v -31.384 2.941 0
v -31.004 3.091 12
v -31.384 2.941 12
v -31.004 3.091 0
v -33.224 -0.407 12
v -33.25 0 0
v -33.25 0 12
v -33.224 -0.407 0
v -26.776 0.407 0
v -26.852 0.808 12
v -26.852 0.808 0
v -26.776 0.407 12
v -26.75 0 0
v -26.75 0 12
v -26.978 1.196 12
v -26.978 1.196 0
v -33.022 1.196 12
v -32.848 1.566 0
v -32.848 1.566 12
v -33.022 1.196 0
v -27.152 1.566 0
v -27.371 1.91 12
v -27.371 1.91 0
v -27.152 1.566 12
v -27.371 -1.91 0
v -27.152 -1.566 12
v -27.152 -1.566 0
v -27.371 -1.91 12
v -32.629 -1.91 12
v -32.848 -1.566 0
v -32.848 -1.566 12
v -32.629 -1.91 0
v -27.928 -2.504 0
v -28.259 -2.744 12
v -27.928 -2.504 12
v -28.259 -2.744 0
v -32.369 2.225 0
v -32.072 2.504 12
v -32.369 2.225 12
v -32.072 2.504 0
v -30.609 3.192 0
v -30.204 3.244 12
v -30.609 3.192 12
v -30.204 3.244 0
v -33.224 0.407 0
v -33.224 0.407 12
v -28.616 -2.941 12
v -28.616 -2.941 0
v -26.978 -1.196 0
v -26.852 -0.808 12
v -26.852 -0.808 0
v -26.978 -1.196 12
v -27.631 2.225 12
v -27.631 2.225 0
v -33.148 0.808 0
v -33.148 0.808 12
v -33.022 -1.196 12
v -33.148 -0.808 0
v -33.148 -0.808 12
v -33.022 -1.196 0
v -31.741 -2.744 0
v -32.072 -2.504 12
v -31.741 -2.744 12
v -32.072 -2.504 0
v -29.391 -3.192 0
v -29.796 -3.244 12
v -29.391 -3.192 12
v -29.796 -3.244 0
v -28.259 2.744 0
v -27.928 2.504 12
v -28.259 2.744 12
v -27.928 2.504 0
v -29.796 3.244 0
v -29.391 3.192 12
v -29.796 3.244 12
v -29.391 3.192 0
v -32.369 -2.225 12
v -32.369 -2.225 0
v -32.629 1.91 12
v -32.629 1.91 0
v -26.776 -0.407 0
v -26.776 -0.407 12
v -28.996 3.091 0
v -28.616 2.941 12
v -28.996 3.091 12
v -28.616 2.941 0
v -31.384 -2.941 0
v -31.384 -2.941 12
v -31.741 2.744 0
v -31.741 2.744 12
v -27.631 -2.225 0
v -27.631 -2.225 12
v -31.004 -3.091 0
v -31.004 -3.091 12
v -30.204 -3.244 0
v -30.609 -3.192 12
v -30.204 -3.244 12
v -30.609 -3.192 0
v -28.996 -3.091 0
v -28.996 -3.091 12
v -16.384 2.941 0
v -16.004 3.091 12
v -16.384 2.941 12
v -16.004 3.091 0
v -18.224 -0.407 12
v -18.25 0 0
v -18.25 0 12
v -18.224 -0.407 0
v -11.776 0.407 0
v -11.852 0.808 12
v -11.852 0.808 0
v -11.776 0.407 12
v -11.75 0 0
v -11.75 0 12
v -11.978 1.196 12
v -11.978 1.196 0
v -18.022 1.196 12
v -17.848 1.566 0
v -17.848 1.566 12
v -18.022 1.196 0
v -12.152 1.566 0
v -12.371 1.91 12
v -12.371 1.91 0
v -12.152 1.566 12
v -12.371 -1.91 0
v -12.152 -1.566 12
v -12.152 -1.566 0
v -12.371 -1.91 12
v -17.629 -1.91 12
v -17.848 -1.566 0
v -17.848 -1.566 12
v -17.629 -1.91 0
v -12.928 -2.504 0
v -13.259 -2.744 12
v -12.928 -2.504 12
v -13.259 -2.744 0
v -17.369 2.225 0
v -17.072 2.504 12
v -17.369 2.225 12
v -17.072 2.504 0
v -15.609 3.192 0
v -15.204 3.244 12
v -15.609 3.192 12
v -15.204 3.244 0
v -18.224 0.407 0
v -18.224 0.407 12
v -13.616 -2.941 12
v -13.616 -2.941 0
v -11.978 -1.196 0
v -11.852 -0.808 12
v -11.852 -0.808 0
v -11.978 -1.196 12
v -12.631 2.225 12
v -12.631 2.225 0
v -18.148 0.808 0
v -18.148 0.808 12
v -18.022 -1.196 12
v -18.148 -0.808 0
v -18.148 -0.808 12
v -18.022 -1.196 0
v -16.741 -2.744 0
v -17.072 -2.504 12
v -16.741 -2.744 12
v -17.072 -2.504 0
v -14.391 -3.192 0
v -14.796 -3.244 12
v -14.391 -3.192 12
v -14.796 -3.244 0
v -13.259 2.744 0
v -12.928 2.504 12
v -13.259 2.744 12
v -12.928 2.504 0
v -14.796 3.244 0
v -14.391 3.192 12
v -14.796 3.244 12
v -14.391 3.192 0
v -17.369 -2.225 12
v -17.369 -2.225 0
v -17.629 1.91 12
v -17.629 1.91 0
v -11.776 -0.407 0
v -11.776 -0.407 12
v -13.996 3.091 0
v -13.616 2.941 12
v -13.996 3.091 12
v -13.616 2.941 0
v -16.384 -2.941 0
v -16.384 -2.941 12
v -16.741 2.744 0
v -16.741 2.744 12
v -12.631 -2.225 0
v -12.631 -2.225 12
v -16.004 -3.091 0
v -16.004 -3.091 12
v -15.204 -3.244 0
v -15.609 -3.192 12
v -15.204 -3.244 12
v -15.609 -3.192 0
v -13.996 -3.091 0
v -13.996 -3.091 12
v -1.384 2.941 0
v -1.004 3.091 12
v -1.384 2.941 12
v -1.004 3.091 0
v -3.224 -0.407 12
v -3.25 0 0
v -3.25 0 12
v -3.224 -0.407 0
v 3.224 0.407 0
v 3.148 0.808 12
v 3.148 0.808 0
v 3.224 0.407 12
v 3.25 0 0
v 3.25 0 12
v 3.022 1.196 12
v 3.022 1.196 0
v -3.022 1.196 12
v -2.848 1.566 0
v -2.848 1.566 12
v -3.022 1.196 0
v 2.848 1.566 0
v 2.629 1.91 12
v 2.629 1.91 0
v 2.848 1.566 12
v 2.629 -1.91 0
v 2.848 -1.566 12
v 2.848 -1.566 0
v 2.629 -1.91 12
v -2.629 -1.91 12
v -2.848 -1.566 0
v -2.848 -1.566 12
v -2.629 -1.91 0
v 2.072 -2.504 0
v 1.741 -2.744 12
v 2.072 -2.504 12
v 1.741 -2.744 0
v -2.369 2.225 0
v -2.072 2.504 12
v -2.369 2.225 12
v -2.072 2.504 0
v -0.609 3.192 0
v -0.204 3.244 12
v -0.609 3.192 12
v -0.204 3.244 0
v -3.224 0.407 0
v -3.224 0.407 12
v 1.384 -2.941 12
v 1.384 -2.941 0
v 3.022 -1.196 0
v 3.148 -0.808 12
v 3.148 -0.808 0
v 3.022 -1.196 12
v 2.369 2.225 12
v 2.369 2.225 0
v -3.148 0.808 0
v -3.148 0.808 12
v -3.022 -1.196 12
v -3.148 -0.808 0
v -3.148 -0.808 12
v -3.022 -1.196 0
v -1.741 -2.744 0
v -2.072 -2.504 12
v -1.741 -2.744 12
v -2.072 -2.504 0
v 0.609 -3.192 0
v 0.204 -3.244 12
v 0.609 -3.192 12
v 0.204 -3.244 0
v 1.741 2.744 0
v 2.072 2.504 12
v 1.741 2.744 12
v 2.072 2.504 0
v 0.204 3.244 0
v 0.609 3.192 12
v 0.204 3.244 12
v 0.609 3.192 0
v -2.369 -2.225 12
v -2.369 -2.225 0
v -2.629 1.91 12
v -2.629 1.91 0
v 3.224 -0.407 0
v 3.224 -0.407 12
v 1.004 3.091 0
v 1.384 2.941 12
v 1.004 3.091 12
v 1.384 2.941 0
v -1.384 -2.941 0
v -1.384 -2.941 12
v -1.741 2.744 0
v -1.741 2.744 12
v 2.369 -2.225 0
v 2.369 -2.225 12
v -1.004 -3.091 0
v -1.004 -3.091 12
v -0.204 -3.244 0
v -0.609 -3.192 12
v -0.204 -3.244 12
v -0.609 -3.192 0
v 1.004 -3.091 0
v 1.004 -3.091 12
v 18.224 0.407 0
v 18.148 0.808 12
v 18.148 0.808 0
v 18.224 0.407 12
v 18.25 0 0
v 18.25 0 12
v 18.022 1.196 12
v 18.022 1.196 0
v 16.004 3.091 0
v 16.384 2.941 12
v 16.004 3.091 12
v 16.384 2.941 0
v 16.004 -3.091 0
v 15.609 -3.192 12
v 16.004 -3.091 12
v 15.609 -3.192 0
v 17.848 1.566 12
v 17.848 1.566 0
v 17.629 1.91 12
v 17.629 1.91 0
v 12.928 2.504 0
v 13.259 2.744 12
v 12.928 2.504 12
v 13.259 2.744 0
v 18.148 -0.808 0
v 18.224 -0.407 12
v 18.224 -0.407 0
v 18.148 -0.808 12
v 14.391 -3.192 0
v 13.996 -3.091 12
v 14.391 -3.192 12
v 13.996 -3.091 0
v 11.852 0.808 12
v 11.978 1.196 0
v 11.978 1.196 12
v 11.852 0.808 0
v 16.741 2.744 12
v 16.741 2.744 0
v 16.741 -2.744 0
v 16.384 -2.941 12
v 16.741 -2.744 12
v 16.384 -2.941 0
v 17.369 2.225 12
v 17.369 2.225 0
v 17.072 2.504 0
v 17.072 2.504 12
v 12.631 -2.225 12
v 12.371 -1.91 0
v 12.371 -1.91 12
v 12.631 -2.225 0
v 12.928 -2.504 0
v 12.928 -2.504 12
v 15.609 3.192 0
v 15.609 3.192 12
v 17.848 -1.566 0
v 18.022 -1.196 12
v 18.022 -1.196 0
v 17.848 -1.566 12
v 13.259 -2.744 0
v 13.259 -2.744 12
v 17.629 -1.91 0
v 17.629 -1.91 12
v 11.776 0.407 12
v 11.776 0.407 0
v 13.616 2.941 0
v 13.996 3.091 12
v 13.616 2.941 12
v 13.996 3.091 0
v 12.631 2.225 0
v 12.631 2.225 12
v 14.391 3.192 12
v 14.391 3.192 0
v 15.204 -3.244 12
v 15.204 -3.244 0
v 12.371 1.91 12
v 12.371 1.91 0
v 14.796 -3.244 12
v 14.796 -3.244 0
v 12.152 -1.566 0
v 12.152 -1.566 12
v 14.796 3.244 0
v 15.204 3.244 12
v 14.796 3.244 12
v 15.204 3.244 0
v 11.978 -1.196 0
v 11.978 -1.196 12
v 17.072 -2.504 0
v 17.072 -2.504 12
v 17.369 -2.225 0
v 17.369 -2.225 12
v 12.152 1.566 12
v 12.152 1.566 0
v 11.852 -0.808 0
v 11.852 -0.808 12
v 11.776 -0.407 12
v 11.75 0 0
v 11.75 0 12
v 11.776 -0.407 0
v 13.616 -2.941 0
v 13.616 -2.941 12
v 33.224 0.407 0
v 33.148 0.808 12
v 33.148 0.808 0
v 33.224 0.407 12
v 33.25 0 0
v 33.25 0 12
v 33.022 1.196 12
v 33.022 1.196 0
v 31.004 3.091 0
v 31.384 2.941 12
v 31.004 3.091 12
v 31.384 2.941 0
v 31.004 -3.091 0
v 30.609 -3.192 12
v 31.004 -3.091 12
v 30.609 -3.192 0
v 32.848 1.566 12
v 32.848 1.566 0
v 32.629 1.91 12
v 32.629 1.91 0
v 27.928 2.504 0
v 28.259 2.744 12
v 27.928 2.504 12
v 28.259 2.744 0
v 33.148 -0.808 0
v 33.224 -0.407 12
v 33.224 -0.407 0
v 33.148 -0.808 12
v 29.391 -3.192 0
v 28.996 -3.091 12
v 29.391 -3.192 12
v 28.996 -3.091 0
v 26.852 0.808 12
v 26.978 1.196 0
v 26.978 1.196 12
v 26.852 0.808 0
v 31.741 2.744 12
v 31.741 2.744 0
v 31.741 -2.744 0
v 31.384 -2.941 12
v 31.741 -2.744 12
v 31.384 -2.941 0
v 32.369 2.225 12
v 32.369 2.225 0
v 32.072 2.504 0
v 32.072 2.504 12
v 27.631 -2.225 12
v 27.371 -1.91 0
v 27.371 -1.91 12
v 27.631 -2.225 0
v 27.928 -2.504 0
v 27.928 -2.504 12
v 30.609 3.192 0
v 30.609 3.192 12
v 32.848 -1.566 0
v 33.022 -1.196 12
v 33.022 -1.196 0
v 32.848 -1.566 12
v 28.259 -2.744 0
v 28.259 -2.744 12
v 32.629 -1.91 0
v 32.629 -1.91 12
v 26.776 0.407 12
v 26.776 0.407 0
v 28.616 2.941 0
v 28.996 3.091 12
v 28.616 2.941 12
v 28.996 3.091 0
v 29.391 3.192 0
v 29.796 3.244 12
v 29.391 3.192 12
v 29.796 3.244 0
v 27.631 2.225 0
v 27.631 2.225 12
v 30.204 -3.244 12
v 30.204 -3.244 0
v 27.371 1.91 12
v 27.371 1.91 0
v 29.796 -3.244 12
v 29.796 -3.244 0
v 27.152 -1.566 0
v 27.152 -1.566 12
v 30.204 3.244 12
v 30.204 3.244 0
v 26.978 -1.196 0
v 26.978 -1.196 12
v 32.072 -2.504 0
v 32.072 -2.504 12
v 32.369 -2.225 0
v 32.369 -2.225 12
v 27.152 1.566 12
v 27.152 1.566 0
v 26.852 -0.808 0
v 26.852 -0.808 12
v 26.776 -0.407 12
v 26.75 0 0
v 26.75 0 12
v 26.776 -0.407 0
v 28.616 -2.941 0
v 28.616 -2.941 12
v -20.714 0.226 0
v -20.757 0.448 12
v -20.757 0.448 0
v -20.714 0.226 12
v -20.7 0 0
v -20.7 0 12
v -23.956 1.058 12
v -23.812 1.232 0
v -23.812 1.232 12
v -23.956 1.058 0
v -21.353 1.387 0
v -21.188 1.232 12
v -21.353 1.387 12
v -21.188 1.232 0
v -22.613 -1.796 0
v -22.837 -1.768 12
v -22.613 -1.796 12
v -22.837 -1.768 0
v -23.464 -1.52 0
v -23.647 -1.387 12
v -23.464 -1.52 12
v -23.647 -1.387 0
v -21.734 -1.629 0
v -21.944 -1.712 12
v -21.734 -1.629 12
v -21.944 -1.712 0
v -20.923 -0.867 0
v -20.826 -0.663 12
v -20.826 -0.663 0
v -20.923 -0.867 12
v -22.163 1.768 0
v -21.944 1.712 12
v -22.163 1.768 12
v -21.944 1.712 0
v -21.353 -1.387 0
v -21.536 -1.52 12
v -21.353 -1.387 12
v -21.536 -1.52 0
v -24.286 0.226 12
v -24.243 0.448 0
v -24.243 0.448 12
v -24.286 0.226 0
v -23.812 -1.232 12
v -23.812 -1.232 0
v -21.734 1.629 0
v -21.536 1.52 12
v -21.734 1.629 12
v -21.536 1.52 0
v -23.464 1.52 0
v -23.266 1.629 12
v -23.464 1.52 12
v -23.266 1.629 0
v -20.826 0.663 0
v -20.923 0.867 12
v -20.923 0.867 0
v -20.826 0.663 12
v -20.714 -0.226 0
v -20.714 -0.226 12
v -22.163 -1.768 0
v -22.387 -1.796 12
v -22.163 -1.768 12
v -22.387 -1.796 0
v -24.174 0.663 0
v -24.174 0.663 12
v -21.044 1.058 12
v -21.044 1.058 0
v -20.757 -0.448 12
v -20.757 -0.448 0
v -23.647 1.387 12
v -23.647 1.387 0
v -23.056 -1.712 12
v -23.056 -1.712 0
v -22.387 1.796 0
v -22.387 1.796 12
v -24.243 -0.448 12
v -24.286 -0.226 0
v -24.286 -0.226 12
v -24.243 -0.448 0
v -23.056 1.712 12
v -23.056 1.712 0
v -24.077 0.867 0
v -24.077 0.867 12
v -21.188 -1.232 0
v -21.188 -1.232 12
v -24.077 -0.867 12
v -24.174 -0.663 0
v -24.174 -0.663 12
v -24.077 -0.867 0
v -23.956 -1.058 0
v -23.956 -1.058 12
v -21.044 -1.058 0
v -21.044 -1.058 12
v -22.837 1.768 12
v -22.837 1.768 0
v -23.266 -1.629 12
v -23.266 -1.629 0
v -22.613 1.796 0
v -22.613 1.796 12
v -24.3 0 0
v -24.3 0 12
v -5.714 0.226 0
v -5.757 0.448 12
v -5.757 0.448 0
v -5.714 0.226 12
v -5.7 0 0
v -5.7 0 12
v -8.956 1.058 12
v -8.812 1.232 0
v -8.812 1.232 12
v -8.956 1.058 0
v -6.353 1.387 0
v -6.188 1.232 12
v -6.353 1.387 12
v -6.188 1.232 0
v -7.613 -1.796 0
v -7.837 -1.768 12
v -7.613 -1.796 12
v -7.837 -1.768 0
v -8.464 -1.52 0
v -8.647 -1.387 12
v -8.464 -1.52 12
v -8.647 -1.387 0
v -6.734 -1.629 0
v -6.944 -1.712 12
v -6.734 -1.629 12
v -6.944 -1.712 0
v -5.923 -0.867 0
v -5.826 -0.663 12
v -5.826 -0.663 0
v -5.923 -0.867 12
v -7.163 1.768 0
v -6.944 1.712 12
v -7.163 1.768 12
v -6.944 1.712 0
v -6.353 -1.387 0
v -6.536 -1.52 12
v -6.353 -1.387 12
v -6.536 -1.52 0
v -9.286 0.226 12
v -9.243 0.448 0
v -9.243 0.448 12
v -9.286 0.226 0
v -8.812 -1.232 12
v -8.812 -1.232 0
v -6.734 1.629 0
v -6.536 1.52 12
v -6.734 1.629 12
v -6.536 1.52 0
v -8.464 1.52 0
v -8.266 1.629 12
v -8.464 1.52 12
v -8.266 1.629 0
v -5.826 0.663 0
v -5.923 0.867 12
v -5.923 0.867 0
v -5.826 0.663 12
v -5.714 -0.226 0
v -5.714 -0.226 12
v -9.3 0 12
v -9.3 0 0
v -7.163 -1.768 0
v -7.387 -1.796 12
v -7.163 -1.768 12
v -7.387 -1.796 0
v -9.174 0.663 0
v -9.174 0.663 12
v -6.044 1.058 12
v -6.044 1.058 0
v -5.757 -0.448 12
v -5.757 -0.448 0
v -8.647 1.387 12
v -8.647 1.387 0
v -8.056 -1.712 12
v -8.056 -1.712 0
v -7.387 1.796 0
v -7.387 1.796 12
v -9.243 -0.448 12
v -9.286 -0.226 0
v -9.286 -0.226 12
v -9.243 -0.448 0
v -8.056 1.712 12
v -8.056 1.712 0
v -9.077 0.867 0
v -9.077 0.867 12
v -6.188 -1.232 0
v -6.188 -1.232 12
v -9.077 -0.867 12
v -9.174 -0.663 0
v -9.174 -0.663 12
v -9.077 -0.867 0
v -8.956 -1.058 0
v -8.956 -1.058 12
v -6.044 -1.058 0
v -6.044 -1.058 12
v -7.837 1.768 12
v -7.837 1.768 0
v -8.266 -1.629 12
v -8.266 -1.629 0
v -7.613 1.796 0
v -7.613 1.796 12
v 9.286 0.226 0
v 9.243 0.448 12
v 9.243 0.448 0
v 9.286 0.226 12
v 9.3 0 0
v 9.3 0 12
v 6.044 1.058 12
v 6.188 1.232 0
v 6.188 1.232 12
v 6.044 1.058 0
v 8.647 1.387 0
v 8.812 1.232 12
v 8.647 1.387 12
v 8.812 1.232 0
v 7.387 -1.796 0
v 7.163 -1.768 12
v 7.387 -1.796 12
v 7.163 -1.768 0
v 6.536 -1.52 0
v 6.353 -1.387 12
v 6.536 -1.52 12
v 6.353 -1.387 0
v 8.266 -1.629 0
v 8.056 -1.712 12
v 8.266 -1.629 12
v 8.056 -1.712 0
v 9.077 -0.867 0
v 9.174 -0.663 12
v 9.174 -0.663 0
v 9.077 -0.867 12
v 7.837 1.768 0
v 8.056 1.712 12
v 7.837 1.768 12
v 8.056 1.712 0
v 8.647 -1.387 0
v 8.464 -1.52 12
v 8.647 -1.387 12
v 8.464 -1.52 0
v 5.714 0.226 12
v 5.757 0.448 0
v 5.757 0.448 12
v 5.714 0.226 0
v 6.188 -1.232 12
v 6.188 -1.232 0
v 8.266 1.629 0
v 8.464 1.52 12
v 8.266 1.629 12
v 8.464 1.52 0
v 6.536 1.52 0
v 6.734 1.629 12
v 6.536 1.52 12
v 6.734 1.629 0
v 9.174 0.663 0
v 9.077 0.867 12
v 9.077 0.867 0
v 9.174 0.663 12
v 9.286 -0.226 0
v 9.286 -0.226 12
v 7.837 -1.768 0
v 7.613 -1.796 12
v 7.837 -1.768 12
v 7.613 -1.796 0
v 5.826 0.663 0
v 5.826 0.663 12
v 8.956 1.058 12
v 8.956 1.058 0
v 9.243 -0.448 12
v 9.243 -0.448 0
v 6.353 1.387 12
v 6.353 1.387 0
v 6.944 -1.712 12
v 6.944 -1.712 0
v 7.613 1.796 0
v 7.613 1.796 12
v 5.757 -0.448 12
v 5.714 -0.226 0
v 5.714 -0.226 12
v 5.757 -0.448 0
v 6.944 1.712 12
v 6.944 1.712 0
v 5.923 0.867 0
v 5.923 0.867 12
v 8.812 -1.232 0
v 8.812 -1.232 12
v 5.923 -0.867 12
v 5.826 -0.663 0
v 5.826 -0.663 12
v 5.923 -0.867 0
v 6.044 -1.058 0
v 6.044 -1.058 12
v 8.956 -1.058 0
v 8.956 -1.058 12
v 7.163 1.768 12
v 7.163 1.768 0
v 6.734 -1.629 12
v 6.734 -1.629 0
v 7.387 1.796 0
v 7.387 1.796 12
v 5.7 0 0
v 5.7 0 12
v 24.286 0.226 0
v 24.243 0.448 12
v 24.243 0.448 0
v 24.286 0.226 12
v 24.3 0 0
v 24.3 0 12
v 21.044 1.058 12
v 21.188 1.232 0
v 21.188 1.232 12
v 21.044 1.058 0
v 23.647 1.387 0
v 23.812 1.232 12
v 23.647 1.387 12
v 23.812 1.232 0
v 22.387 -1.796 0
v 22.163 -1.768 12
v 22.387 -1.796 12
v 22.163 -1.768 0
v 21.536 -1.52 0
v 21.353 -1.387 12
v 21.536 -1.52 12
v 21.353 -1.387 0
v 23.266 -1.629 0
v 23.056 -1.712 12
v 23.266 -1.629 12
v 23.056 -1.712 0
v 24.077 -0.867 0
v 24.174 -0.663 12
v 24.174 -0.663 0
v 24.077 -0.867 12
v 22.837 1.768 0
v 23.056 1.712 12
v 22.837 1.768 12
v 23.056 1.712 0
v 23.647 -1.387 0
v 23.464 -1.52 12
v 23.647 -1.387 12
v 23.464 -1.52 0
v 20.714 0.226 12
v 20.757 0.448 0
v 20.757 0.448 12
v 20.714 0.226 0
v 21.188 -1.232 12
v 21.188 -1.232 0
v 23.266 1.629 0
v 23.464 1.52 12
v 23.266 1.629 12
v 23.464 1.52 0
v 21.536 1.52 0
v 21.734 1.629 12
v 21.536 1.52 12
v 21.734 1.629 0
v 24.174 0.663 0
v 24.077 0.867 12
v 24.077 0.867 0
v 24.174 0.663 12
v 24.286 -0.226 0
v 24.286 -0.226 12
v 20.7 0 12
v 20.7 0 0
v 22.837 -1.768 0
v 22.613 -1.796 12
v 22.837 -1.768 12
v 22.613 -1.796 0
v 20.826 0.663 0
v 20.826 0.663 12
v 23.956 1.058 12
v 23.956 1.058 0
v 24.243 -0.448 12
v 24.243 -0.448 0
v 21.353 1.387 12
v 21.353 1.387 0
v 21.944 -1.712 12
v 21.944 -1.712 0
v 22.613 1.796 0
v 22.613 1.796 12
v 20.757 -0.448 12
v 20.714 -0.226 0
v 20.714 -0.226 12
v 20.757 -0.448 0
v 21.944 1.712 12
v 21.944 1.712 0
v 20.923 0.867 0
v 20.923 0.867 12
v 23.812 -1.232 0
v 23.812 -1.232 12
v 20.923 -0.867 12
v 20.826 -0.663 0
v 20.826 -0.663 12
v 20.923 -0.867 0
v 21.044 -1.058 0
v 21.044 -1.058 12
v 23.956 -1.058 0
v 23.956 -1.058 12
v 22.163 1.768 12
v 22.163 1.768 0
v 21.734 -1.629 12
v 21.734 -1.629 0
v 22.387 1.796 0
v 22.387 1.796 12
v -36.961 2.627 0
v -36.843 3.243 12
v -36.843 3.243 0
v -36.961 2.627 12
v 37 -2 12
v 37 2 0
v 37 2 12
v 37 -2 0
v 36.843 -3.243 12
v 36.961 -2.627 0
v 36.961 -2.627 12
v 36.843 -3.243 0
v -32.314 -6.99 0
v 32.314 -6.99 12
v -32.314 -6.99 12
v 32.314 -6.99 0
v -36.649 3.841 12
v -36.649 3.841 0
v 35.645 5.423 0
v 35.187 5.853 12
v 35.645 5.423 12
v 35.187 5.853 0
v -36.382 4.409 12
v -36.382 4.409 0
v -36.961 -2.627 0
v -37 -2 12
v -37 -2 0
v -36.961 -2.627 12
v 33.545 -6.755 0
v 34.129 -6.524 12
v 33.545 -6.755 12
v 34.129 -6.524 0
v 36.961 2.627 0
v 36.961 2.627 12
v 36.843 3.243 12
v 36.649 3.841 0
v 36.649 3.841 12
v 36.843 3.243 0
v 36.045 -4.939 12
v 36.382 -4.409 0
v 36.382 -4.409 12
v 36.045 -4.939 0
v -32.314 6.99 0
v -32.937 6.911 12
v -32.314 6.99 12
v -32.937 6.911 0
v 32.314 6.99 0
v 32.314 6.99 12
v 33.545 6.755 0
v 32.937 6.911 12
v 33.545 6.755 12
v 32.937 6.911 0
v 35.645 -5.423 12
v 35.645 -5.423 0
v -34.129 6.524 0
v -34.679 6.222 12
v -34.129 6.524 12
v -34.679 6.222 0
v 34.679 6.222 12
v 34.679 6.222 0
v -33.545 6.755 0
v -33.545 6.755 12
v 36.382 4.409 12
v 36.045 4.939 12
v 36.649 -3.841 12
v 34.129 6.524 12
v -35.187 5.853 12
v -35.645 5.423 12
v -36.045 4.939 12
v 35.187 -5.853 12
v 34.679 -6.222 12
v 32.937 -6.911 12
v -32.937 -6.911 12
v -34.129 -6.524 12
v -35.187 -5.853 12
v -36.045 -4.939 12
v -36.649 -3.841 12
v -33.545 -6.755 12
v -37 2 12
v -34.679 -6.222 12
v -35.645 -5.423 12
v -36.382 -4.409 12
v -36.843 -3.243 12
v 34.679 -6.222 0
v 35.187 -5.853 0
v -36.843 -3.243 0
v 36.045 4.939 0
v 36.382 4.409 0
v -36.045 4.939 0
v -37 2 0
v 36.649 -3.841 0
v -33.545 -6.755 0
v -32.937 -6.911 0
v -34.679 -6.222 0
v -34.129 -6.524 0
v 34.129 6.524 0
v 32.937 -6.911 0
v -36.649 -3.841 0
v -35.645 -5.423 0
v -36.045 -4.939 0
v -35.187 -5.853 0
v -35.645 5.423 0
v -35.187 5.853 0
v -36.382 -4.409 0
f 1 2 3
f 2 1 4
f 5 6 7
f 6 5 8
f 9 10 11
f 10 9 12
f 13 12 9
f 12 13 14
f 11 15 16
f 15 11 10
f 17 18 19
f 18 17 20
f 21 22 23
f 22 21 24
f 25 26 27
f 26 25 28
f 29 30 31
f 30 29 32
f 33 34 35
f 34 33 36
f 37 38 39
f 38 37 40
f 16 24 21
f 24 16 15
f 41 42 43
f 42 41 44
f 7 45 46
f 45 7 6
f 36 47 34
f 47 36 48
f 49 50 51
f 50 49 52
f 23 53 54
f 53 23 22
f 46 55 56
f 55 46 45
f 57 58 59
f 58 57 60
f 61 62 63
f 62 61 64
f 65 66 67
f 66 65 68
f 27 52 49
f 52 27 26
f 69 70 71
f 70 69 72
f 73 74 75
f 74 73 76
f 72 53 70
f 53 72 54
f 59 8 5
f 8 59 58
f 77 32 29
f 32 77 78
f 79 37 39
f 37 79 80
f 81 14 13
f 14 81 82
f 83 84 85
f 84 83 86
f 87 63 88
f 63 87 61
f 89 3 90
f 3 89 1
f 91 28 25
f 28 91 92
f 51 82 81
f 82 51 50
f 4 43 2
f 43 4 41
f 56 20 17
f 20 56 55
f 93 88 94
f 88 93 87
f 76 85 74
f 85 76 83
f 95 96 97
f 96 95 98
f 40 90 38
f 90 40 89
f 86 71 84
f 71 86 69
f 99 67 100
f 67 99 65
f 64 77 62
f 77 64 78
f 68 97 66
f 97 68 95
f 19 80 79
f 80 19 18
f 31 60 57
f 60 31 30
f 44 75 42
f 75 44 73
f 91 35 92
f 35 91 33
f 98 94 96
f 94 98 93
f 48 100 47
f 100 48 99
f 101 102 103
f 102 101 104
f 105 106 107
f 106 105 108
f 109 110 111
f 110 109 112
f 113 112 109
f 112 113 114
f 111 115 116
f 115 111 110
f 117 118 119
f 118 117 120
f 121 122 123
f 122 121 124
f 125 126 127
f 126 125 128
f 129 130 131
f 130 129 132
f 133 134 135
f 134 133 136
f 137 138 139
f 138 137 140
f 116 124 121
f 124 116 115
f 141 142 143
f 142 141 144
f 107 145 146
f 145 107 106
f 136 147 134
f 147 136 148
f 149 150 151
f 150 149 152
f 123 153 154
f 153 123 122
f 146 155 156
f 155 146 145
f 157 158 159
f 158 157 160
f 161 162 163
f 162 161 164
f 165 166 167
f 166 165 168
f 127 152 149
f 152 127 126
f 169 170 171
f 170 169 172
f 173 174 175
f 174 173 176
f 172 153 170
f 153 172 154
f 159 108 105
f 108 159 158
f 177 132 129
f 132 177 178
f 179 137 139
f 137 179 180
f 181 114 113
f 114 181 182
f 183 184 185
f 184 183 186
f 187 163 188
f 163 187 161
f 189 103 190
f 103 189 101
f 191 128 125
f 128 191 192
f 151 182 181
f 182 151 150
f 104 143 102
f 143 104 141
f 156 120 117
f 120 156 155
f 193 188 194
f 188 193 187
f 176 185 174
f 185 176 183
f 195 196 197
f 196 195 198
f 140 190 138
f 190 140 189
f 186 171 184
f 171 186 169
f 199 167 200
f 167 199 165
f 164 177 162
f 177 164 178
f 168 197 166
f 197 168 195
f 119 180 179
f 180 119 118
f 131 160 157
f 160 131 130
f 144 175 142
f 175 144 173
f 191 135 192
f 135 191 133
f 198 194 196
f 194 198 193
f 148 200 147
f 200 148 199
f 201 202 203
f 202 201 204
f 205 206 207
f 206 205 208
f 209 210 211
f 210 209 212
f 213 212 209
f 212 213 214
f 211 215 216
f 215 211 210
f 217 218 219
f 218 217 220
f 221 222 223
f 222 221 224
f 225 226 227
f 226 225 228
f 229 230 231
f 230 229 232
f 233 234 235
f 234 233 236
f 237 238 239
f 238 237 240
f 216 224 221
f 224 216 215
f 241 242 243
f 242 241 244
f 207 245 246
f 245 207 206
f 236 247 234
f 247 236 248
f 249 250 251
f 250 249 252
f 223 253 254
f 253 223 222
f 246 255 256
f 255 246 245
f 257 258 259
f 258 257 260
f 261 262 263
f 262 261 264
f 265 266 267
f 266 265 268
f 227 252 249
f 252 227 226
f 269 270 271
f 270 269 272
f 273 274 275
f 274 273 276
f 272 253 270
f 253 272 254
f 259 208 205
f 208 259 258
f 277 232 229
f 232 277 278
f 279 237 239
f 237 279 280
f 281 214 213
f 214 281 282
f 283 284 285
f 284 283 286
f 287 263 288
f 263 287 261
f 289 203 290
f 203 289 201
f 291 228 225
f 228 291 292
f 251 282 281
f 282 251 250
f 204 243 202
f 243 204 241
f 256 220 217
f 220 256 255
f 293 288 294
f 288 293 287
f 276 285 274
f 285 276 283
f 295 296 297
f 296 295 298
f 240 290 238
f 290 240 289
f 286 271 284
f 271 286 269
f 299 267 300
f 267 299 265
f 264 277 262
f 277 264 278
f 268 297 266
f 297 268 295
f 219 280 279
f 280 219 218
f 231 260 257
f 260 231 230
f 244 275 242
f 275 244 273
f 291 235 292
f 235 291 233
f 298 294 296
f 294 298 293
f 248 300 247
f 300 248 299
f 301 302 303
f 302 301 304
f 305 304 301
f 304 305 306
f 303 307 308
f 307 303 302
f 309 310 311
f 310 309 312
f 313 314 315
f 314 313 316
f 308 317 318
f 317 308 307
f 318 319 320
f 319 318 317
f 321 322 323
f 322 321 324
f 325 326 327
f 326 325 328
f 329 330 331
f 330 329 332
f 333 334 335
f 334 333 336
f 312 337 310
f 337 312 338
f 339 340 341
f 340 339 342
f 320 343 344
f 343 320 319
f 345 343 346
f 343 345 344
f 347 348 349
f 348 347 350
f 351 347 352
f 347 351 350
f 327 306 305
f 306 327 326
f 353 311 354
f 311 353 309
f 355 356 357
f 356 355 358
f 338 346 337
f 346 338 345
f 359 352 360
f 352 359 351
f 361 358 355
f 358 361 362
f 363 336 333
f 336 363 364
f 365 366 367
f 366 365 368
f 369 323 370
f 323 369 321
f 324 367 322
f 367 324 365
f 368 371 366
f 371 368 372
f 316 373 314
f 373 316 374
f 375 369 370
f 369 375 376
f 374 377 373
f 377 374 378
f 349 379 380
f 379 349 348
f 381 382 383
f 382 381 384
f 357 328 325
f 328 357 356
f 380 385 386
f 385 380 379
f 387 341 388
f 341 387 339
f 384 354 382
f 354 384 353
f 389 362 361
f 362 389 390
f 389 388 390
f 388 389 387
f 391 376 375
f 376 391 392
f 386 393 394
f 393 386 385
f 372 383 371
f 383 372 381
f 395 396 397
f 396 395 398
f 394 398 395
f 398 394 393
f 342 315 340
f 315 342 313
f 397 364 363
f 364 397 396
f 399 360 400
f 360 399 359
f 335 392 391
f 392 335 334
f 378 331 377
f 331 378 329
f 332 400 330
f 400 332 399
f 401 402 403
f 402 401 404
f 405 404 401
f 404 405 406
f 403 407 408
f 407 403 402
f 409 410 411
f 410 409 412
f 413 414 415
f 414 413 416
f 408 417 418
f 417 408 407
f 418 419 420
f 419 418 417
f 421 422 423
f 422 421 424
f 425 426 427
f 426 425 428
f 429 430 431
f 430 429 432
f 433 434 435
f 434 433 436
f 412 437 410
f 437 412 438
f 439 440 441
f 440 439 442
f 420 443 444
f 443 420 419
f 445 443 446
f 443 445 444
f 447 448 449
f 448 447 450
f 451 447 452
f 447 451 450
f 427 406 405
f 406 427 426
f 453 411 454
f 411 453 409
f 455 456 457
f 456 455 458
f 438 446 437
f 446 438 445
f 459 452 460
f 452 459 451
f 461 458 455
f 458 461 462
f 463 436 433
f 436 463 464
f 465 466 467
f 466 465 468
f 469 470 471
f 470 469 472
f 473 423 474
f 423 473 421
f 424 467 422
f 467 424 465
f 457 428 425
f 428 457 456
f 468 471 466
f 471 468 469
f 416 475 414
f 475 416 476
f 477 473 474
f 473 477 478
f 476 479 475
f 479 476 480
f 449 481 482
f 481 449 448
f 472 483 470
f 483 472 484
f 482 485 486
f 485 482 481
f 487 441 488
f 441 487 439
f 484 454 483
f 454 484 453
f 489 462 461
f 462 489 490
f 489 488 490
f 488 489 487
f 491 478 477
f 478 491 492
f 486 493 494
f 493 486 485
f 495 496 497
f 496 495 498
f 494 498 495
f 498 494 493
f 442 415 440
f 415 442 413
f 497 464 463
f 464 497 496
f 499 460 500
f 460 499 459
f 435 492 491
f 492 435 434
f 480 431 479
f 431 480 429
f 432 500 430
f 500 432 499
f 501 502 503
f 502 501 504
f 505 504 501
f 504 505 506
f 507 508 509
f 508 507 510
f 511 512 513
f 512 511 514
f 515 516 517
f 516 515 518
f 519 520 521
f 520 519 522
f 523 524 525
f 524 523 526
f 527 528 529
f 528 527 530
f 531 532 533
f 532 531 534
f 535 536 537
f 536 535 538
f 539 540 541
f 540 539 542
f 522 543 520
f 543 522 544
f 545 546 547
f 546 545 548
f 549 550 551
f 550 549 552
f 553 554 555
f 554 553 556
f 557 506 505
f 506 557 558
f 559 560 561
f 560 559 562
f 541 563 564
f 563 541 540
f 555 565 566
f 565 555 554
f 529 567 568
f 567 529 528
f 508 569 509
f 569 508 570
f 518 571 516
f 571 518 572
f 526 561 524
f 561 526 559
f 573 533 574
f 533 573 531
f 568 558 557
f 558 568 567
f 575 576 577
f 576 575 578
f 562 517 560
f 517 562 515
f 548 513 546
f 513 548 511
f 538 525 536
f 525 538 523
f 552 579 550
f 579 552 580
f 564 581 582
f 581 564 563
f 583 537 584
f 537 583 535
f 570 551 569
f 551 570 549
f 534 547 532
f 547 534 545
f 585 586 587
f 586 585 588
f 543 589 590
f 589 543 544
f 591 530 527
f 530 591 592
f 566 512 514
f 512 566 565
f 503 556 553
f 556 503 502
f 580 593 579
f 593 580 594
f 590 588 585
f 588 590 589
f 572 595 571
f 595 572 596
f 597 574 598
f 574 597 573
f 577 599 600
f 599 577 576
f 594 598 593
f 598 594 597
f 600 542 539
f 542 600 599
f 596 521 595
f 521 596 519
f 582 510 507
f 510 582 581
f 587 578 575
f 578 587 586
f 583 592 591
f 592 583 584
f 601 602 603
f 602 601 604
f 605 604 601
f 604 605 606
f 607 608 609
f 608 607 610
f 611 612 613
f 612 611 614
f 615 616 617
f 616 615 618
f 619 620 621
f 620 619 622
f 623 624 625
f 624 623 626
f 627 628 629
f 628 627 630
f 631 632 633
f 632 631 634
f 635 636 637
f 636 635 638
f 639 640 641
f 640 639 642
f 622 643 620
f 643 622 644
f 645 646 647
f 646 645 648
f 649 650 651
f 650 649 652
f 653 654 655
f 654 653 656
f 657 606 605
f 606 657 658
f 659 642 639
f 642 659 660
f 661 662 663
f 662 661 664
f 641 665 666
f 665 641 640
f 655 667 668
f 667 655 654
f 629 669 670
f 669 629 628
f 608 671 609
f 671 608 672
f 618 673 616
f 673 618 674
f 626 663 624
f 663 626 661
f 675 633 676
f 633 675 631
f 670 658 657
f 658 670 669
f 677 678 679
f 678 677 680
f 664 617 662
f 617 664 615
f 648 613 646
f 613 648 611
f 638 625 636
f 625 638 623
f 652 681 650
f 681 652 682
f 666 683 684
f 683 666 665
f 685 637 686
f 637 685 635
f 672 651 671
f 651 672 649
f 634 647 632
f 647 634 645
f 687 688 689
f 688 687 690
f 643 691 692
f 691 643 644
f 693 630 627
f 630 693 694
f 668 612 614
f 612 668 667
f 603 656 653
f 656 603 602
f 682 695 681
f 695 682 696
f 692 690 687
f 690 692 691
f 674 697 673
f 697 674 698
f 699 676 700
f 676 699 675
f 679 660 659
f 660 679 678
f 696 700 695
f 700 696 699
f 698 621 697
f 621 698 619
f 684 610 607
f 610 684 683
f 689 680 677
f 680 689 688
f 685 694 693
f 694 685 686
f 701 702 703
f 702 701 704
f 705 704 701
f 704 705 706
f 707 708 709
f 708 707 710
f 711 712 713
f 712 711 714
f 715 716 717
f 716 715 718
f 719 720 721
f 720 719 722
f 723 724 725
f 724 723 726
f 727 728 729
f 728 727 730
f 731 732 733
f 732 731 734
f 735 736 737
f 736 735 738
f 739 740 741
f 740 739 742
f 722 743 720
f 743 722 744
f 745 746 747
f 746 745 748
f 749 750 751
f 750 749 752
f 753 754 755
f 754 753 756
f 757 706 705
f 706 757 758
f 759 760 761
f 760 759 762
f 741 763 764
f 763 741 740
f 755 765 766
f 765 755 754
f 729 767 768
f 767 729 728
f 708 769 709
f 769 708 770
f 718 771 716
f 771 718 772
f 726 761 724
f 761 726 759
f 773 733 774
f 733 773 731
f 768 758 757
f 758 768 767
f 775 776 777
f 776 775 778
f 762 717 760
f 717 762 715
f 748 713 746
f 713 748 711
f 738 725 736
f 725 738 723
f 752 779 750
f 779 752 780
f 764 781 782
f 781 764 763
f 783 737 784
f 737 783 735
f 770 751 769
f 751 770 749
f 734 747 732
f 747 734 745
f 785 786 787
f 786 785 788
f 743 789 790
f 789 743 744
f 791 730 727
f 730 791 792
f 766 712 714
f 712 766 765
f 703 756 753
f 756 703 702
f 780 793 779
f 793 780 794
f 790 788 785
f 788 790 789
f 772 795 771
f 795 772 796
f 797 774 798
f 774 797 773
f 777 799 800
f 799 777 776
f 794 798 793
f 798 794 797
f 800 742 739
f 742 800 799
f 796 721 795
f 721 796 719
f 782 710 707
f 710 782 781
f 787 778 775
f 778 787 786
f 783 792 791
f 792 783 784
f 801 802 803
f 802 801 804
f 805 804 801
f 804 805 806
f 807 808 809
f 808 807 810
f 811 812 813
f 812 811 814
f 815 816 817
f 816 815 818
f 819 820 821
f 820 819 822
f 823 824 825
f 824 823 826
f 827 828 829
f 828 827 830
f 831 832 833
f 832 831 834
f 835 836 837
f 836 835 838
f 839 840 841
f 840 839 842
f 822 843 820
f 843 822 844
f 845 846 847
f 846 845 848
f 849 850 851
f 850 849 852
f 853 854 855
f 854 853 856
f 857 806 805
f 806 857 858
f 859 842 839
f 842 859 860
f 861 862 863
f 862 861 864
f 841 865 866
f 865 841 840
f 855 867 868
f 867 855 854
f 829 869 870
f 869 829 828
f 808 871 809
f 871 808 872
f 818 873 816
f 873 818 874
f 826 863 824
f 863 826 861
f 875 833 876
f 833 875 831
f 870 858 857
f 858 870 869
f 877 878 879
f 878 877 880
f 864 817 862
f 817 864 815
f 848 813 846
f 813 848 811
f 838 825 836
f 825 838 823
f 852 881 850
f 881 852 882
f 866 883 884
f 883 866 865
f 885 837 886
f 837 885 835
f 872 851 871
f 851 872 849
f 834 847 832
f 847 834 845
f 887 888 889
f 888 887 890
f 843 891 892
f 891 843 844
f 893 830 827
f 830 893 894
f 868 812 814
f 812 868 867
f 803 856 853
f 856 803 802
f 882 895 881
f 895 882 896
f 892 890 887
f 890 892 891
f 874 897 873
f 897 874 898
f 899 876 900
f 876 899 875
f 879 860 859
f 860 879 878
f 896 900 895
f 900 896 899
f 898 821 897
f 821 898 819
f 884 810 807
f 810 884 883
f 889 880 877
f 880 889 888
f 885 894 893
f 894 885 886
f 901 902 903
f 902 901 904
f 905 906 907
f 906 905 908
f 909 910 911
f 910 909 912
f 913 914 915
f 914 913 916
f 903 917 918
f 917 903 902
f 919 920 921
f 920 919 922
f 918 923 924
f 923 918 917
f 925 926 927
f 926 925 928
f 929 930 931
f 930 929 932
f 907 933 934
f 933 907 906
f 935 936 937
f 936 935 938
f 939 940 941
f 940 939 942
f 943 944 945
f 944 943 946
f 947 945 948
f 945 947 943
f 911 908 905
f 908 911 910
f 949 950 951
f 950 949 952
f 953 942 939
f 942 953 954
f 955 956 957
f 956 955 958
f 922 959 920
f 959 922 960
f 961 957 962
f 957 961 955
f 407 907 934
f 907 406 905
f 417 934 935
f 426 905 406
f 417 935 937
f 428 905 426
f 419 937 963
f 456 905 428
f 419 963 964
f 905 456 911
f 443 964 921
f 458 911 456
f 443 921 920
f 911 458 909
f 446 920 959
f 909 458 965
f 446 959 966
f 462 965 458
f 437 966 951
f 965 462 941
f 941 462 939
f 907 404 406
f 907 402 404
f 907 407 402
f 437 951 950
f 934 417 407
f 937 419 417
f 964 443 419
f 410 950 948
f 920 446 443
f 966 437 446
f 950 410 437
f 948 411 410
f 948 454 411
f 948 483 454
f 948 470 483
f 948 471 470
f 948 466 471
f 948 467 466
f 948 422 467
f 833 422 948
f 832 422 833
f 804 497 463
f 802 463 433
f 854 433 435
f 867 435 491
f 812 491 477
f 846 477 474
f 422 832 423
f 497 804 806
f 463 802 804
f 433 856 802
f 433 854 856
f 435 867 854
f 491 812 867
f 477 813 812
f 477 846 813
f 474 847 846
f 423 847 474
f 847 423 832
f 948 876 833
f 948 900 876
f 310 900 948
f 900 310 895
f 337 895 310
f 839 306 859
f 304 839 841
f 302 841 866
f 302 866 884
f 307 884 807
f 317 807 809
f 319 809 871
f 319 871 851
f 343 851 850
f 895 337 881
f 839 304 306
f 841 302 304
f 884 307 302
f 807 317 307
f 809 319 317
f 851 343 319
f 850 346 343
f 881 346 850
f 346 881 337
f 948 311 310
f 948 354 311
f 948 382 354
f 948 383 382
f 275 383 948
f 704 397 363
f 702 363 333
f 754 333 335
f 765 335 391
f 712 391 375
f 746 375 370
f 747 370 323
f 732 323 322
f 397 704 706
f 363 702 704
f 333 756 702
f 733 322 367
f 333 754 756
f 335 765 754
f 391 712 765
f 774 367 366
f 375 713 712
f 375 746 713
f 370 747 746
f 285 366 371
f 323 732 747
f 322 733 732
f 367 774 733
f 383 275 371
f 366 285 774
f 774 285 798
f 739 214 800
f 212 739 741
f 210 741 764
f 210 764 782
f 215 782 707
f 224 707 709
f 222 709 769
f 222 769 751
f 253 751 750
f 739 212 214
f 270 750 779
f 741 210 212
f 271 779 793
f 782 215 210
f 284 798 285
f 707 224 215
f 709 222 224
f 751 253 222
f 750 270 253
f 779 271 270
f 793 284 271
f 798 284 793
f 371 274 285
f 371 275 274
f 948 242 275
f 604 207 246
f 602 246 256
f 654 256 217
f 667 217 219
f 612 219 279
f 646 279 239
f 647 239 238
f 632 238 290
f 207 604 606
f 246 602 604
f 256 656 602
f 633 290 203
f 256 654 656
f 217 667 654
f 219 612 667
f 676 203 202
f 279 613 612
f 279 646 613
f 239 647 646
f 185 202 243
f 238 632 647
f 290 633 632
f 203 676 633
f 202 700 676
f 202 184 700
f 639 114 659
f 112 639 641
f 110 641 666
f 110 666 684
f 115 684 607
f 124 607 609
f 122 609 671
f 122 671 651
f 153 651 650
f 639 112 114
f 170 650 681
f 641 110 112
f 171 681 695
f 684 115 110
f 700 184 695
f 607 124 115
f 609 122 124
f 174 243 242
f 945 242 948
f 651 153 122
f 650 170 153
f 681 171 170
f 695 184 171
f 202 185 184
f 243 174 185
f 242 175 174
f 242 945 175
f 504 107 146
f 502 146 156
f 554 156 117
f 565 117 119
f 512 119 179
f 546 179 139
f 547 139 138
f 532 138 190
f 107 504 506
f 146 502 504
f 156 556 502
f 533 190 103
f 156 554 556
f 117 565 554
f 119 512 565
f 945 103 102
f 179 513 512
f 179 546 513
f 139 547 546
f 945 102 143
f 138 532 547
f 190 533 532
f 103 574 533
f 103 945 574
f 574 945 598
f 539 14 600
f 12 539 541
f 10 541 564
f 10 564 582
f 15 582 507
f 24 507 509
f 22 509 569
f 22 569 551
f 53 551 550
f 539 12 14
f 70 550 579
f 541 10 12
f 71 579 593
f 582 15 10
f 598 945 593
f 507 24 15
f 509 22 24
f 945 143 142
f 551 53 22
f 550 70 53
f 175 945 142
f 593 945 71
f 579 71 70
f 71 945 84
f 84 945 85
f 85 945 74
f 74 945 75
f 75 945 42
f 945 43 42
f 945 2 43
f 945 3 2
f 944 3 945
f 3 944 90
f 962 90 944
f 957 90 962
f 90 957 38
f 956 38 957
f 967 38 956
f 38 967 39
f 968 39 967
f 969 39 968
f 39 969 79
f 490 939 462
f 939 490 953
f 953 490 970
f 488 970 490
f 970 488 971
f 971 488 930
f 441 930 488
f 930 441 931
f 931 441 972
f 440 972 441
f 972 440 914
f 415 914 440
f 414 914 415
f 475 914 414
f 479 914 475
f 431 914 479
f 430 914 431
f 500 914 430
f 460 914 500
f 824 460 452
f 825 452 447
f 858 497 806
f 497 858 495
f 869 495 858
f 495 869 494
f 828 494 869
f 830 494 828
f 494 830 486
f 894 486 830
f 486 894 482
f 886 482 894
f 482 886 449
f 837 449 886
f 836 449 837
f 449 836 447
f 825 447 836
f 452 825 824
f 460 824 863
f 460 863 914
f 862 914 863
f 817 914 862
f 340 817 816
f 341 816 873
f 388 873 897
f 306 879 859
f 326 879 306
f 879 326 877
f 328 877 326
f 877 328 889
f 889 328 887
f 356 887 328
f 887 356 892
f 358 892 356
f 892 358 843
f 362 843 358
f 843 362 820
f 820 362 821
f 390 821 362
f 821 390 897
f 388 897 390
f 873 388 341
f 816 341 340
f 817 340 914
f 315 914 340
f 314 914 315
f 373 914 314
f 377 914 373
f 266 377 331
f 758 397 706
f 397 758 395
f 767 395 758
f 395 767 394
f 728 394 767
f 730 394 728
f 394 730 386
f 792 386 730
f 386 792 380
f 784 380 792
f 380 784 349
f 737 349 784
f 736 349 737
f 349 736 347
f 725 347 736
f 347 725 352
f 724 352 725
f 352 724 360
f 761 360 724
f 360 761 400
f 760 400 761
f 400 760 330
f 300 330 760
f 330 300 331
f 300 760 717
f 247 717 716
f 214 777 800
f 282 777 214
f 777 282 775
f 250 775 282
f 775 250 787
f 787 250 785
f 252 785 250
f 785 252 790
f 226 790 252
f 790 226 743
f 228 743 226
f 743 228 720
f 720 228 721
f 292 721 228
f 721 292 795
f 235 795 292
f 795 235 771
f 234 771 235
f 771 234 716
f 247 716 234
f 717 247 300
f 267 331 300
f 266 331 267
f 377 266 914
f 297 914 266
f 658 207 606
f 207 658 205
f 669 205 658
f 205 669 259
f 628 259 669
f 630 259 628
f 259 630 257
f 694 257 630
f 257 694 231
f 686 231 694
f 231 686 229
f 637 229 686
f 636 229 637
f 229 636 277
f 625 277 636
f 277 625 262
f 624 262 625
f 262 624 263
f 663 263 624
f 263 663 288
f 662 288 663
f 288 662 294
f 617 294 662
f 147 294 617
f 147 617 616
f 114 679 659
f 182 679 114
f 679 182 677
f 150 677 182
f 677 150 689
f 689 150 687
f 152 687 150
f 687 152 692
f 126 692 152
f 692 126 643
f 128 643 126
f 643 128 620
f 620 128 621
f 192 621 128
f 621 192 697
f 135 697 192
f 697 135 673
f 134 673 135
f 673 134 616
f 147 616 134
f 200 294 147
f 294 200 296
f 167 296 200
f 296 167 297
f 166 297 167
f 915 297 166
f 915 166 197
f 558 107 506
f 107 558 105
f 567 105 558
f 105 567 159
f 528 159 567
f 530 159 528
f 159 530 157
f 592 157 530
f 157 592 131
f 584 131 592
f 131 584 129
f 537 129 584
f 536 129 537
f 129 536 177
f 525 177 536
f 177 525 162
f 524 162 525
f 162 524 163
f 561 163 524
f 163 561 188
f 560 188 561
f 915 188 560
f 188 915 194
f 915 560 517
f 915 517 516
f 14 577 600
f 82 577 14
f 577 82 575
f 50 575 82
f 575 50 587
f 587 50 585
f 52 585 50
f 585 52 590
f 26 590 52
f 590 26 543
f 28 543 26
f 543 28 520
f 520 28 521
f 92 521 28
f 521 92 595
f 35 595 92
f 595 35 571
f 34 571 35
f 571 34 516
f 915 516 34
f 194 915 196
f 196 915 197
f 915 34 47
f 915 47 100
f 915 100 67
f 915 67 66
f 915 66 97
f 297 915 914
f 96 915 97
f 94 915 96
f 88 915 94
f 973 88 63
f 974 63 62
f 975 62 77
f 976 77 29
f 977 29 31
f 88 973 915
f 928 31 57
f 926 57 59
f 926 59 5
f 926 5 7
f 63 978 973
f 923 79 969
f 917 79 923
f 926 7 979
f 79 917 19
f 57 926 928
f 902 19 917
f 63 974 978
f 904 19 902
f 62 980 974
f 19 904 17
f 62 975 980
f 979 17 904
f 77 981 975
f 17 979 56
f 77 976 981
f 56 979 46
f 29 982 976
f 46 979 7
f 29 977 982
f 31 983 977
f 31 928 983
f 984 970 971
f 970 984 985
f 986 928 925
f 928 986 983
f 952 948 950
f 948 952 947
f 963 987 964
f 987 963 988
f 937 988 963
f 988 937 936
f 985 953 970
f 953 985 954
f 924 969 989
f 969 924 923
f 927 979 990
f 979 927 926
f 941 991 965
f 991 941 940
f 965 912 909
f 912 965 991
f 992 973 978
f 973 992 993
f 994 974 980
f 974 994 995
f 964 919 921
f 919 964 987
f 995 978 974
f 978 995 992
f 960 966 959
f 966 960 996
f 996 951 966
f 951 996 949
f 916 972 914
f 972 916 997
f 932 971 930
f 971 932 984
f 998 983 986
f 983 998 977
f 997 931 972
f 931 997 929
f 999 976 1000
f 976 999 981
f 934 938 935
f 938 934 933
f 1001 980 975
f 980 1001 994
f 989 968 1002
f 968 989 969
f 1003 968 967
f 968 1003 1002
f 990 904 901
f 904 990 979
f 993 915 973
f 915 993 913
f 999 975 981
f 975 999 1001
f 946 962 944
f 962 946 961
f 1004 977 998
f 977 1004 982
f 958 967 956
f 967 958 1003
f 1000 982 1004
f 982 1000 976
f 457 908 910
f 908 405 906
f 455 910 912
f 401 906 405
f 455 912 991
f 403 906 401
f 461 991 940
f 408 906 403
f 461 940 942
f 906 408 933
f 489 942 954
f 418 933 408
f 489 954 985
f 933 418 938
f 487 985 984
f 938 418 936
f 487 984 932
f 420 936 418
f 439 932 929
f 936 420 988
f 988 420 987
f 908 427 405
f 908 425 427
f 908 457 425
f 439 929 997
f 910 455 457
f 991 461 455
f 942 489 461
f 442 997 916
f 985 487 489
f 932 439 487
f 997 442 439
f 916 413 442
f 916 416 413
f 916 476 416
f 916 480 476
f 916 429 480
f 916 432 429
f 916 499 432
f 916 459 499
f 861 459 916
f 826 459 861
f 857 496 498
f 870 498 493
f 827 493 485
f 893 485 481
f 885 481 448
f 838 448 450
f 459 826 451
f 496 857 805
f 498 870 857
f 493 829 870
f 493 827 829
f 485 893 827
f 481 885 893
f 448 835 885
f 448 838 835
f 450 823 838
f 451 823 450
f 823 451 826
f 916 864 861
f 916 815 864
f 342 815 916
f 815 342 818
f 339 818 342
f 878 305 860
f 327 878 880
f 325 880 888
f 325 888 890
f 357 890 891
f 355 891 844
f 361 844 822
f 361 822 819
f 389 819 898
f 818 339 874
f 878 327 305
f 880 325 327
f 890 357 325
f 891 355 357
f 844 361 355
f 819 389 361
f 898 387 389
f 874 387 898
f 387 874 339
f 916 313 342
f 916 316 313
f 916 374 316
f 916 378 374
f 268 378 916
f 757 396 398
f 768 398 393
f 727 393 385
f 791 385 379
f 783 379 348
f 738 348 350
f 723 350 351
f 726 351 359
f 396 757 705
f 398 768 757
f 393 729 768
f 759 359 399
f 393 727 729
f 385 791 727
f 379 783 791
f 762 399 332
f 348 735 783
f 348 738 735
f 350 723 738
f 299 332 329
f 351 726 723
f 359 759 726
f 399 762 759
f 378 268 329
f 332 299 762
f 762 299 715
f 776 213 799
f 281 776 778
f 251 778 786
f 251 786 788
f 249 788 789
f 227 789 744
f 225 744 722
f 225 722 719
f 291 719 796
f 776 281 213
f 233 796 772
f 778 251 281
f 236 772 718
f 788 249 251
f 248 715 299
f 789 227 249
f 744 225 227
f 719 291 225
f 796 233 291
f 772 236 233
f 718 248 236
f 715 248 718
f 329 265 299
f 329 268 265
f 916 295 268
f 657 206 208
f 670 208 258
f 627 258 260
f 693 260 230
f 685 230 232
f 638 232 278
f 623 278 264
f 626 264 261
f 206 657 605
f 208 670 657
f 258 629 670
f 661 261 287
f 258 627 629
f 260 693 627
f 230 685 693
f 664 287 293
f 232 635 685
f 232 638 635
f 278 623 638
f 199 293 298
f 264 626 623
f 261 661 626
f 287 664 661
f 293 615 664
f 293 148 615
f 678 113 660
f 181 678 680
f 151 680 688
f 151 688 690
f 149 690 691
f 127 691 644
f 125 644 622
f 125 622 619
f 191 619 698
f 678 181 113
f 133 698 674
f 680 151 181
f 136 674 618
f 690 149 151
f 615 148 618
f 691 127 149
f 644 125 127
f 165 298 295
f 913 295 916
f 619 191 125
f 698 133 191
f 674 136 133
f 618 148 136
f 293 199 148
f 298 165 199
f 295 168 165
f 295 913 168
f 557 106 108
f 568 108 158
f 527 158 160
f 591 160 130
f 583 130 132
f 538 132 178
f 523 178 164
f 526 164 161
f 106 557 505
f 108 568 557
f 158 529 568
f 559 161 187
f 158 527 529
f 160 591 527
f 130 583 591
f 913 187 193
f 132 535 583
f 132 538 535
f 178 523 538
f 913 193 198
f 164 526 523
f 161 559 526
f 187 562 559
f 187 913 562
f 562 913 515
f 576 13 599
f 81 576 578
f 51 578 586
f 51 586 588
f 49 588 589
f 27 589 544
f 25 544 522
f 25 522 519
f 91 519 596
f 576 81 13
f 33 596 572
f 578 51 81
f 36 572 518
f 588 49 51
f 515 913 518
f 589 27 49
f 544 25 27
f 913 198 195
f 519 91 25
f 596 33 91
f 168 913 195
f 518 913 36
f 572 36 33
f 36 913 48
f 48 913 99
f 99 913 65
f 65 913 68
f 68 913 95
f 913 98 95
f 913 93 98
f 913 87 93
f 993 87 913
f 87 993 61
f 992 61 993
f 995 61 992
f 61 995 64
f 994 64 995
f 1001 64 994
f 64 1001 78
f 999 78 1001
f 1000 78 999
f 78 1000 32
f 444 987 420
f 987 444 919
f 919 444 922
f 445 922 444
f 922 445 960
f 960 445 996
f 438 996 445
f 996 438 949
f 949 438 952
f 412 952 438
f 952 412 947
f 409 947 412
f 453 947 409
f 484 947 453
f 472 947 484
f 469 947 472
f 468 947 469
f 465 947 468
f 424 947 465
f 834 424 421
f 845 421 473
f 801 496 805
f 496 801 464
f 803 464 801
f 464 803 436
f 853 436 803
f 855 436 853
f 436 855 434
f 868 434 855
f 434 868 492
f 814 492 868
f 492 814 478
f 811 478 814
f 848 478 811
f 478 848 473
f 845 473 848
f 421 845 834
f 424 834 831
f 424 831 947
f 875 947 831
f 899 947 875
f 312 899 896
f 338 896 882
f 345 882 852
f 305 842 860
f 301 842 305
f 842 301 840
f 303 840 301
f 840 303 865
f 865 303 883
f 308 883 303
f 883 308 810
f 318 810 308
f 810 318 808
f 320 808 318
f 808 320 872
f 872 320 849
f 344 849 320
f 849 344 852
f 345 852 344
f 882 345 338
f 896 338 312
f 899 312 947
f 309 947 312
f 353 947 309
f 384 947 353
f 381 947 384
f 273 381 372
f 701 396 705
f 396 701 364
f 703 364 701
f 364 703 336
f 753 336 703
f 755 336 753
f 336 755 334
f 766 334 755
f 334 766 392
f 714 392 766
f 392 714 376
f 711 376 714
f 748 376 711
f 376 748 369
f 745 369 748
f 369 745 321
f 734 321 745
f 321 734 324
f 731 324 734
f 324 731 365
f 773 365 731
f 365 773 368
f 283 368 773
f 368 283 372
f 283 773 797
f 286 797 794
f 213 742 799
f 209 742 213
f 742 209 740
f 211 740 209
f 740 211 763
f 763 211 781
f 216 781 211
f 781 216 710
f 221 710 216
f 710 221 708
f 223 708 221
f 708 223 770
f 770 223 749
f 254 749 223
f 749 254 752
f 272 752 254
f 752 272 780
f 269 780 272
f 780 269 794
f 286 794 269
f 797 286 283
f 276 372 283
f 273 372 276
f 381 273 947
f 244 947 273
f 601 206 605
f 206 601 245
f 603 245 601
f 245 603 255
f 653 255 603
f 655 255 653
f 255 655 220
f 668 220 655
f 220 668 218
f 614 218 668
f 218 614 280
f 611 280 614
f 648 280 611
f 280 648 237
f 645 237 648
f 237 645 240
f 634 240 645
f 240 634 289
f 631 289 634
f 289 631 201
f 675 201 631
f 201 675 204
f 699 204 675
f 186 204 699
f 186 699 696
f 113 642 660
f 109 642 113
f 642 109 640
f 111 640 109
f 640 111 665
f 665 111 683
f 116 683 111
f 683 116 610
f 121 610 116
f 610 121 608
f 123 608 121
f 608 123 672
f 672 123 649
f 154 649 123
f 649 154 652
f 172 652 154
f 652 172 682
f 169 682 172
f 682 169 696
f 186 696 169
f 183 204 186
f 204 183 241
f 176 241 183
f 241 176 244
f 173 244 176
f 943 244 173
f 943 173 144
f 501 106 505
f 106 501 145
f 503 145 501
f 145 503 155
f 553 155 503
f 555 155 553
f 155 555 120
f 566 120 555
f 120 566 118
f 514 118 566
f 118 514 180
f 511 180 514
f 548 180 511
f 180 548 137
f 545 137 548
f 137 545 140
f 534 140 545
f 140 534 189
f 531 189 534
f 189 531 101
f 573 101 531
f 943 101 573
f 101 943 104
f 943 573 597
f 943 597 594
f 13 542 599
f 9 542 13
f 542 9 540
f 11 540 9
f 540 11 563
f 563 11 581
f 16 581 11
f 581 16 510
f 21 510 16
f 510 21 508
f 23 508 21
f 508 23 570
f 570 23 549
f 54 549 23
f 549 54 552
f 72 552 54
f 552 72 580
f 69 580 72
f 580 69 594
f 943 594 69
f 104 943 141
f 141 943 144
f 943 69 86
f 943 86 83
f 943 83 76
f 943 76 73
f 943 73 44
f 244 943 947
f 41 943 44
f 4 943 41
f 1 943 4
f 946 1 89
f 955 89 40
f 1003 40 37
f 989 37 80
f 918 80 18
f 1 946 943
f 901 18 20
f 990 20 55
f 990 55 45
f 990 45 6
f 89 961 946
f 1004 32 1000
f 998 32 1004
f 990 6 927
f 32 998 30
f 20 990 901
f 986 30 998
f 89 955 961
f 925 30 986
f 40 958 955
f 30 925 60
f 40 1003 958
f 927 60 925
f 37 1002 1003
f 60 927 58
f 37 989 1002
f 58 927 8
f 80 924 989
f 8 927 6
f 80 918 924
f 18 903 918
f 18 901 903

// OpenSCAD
$fn = 50;


difference() {
	union() {
		hull() {
			translate(v = [-32.0000000000, 2.0000000000, 0]) {
				cylinder(h = 12, r = 5);
			}
			translate(v = [32.0000000000, 2.0000000000, 0]) {
				cylinder(h = 12, r = 5);
			}
			translate(v = [-32.0000000000, -2.0000000000, 0]) {
				cylinder(h = 12, r = 5);
			}
			translate(v = [32.0000000000, -2.0000000000, 0]) {
				cylinder(h = 12, r = 5);
			}
		}
	}
	union() {
		translate(v = [-30.0000000000, 0.0000000000, 0]) {
			translate(v = [0, 0, -100]) {
				cylinder(h = 200, r = 3.2500000000);
			}
		}
		translate(v = [-15.0000000000, 0.0000000000, 0]) {
			translate(v = [0, 0, -100]) {
				cylinder(h = 200, r = 3.2500000000);
			}
		}
		translate(v = [0, 0, -100]) {
			cylinder(h = 200, r = 3.2500000000);
		}
		translate(v = [15.0000000000, 0.0000000000, 0]) {
			translate(v = [0, 0, -100]) {
				cylinder(h = 200, r = 3.2500000000);
			}
		}
		translate(v = [30.0000000000, 0.0000000000, 0]) {
			translate(v = [0, 0, -100]) {
				cylinder(h = 200, r = 3.2500000000);
			}
		}
		translate(v = [-30.0000000000, 0.0000000000, 0]) {
			translate(v = [0, 0, -100]) {
				cylinder(h = 200, r = 1.8000000000);
			}
		}
		translate(v = [-22.5000000000, 0.0000000000, 0]) {
			translate(v = [0, 0, -100]) {
				cylinder(h = 200, r = 1.8000000000);
			}
		}
		translate(v = [-15.0000000000, 0.0000000000, 0]) {
			translate(v = [0, 0, -100]) {
				cylinder(h = 200, r = 1.8000000000);
			}
		}
		translate(v = [-7.5000000000, 0.0000000000, 0]) {
			translate(v = [0, 0, -100]) {
				cylinder(h = 200, r = 1.8000000000);
			}
		}
		translate(v = [0, 0, -100]) {
			cylinder(h = 200, r = 1.8000000000);
		}
		translate(v = [7.5000000000, 0.0000000000, 0]) {
			translate(v = [0, 0, -100]) {
				cylinder(h = 200, r = 1.8000000000);
			}
		}
		translate(v = [15.0000000000, 0.0000000000, 0]) {
			translate(v = [0, 0, -100]) {
				cylinder(h = 200, r = 1.8000000000);
			}
		}
		translate(v = [22.5000000000, 0.0000000000, 0]) {
			translate(v = [0, 0, -100]) {
				cylinder(h = 200, r = 1.8000000000);
			}
		}
		translate(v = [30.0000000000, 0.0000000000, 0]) {
			translate(v = [0, 0, -100]) {
				cylinder(h = 200, r = 1.8000000000);
			}
		}
	}
}
